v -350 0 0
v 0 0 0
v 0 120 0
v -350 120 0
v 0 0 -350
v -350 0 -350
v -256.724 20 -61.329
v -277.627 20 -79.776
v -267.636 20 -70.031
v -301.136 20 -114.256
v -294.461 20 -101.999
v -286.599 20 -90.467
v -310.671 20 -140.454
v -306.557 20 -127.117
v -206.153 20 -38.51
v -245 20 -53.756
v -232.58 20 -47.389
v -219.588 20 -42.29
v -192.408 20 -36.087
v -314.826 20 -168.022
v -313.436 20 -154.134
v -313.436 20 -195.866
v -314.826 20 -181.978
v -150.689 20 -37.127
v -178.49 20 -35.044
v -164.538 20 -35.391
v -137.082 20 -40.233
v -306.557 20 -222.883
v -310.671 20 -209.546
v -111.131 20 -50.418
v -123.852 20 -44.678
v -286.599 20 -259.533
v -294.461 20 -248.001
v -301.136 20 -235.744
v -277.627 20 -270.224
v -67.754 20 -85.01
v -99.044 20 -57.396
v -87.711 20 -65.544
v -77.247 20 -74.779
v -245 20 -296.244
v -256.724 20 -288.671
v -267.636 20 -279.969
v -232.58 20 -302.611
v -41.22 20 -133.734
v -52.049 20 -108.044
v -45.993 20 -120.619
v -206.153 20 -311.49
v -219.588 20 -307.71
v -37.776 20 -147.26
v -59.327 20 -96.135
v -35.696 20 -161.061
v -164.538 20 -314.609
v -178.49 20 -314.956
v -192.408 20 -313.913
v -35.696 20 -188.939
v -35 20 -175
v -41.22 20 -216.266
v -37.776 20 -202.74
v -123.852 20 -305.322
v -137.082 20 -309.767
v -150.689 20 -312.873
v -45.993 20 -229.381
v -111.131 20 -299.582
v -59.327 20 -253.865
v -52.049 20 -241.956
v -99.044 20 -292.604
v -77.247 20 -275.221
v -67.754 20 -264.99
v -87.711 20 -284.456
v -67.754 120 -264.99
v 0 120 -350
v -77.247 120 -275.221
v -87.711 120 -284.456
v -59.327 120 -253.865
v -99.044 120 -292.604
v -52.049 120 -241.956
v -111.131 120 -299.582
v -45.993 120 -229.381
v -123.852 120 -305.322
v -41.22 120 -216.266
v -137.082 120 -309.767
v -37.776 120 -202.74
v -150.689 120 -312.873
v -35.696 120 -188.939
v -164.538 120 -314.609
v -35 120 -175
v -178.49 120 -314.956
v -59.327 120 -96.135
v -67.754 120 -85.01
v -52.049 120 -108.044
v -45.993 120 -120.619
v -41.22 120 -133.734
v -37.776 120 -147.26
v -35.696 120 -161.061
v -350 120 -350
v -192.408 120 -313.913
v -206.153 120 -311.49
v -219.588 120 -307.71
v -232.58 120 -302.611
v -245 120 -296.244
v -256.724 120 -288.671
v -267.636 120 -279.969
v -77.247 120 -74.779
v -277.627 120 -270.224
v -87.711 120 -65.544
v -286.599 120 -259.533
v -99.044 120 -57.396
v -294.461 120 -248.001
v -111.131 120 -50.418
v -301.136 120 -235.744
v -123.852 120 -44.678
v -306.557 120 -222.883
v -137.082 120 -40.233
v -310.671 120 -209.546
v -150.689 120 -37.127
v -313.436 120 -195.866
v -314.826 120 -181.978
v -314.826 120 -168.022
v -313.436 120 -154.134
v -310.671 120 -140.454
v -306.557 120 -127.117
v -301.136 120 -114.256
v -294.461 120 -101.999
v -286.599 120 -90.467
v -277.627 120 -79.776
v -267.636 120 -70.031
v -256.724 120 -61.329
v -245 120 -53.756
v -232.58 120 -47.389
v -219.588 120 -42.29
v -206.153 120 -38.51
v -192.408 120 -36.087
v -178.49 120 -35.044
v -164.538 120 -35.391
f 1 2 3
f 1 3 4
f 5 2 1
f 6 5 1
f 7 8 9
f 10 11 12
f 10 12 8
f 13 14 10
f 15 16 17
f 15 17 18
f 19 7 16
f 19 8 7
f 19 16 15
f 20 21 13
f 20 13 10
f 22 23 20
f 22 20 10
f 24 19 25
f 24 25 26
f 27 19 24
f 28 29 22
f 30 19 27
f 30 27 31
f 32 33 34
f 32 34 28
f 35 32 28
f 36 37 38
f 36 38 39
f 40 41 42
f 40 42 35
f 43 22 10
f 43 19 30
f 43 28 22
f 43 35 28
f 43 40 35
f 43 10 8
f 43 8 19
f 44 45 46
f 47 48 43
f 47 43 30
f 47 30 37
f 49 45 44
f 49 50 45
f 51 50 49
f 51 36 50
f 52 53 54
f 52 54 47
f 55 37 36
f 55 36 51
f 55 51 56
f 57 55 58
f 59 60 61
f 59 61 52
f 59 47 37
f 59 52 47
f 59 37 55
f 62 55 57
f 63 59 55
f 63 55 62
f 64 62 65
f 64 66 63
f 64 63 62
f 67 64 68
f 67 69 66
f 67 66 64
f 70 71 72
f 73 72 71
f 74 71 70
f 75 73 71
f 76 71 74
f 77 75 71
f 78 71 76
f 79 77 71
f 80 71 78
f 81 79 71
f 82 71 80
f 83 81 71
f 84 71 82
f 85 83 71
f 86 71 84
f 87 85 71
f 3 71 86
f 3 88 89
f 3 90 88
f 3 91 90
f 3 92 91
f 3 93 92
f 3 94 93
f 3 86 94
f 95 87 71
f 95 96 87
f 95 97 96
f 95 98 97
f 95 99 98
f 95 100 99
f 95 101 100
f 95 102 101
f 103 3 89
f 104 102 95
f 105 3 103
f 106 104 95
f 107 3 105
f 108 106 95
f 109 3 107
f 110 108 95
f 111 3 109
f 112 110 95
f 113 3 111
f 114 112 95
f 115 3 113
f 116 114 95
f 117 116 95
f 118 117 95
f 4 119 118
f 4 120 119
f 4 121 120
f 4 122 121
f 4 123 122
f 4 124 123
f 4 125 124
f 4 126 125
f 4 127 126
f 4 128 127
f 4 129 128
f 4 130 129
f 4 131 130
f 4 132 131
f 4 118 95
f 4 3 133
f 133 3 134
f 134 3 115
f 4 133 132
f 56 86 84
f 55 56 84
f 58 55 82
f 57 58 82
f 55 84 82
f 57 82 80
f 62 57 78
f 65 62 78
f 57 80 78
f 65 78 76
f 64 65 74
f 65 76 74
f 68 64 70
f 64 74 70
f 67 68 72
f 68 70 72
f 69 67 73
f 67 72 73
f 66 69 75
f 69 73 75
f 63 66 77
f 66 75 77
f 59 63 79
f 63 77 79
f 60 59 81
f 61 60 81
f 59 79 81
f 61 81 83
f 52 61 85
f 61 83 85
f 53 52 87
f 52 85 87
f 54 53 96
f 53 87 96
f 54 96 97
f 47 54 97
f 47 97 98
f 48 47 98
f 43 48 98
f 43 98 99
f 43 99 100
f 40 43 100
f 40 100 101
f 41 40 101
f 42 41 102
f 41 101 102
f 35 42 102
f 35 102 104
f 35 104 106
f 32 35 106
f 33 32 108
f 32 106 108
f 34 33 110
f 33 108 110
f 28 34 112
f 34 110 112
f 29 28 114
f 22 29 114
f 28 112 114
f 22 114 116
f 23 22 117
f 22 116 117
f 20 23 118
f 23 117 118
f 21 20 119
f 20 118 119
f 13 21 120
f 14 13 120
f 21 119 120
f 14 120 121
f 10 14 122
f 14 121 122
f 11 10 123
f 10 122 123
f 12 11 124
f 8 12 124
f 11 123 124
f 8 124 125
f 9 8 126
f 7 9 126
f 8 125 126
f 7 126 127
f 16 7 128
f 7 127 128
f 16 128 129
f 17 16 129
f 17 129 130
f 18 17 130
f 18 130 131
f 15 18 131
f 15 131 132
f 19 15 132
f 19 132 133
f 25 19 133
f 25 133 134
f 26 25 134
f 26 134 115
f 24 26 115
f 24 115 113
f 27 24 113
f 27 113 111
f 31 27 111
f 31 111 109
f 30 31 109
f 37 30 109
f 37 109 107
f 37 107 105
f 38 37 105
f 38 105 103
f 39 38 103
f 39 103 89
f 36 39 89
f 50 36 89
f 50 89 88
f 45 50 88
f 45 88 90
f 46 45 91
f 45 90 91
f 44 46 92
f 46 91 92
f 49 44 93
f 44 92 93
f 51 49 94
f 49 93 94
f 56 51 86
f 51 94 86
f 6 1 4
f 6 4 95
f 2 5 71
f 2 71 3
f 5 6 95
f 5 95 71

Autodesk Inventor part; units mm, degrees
ref_plane "YZ Plane" through (0, 0, 0) normal (1, 0, 0) x (0, 1, 0)
ref_plane "XZ Plane" through (0, 0, 0) normal (0, 1, 0) x (-1, 0, 0)
ref_plane "XY Plane" through (0, 0, 0) normal (0, 0, 1) x (1, 0, 0)
sketch "Esquisse1" plane through (0, 0, 0) normal (0, 1, 0) x (-1, 0, 0)
  line L0 (0, 0) -> (350, 0)
  line L1 (350, 0) -> (350, -350)
  line L2 (350, -350) -> (0, -350)
  line L3 (0, -350) -> (0, 0)
  dimension "d0" = 350
  dimension "d1" = 350
extrude "Extrusion1" add sketch "Esquisse1" along normal blind 120
sketch "Esquisse2" plane through (0, 120, 0) normal (0, 1, 0) x (1, 0, 0)
  line L0 (0, 350) -> (-350, 350) projected
  line L1 (-350, 350) -> (-350, 0) projected
  circle A0 centre (-175, 175) radius 140
  point P0 (0, 0)
  dimension "d4" = 175
  dimension "d5" = 175
  dimension "d6" = 280
extrude "Extrusion2" cut sketch "Esquisse2" against normal blind 100
